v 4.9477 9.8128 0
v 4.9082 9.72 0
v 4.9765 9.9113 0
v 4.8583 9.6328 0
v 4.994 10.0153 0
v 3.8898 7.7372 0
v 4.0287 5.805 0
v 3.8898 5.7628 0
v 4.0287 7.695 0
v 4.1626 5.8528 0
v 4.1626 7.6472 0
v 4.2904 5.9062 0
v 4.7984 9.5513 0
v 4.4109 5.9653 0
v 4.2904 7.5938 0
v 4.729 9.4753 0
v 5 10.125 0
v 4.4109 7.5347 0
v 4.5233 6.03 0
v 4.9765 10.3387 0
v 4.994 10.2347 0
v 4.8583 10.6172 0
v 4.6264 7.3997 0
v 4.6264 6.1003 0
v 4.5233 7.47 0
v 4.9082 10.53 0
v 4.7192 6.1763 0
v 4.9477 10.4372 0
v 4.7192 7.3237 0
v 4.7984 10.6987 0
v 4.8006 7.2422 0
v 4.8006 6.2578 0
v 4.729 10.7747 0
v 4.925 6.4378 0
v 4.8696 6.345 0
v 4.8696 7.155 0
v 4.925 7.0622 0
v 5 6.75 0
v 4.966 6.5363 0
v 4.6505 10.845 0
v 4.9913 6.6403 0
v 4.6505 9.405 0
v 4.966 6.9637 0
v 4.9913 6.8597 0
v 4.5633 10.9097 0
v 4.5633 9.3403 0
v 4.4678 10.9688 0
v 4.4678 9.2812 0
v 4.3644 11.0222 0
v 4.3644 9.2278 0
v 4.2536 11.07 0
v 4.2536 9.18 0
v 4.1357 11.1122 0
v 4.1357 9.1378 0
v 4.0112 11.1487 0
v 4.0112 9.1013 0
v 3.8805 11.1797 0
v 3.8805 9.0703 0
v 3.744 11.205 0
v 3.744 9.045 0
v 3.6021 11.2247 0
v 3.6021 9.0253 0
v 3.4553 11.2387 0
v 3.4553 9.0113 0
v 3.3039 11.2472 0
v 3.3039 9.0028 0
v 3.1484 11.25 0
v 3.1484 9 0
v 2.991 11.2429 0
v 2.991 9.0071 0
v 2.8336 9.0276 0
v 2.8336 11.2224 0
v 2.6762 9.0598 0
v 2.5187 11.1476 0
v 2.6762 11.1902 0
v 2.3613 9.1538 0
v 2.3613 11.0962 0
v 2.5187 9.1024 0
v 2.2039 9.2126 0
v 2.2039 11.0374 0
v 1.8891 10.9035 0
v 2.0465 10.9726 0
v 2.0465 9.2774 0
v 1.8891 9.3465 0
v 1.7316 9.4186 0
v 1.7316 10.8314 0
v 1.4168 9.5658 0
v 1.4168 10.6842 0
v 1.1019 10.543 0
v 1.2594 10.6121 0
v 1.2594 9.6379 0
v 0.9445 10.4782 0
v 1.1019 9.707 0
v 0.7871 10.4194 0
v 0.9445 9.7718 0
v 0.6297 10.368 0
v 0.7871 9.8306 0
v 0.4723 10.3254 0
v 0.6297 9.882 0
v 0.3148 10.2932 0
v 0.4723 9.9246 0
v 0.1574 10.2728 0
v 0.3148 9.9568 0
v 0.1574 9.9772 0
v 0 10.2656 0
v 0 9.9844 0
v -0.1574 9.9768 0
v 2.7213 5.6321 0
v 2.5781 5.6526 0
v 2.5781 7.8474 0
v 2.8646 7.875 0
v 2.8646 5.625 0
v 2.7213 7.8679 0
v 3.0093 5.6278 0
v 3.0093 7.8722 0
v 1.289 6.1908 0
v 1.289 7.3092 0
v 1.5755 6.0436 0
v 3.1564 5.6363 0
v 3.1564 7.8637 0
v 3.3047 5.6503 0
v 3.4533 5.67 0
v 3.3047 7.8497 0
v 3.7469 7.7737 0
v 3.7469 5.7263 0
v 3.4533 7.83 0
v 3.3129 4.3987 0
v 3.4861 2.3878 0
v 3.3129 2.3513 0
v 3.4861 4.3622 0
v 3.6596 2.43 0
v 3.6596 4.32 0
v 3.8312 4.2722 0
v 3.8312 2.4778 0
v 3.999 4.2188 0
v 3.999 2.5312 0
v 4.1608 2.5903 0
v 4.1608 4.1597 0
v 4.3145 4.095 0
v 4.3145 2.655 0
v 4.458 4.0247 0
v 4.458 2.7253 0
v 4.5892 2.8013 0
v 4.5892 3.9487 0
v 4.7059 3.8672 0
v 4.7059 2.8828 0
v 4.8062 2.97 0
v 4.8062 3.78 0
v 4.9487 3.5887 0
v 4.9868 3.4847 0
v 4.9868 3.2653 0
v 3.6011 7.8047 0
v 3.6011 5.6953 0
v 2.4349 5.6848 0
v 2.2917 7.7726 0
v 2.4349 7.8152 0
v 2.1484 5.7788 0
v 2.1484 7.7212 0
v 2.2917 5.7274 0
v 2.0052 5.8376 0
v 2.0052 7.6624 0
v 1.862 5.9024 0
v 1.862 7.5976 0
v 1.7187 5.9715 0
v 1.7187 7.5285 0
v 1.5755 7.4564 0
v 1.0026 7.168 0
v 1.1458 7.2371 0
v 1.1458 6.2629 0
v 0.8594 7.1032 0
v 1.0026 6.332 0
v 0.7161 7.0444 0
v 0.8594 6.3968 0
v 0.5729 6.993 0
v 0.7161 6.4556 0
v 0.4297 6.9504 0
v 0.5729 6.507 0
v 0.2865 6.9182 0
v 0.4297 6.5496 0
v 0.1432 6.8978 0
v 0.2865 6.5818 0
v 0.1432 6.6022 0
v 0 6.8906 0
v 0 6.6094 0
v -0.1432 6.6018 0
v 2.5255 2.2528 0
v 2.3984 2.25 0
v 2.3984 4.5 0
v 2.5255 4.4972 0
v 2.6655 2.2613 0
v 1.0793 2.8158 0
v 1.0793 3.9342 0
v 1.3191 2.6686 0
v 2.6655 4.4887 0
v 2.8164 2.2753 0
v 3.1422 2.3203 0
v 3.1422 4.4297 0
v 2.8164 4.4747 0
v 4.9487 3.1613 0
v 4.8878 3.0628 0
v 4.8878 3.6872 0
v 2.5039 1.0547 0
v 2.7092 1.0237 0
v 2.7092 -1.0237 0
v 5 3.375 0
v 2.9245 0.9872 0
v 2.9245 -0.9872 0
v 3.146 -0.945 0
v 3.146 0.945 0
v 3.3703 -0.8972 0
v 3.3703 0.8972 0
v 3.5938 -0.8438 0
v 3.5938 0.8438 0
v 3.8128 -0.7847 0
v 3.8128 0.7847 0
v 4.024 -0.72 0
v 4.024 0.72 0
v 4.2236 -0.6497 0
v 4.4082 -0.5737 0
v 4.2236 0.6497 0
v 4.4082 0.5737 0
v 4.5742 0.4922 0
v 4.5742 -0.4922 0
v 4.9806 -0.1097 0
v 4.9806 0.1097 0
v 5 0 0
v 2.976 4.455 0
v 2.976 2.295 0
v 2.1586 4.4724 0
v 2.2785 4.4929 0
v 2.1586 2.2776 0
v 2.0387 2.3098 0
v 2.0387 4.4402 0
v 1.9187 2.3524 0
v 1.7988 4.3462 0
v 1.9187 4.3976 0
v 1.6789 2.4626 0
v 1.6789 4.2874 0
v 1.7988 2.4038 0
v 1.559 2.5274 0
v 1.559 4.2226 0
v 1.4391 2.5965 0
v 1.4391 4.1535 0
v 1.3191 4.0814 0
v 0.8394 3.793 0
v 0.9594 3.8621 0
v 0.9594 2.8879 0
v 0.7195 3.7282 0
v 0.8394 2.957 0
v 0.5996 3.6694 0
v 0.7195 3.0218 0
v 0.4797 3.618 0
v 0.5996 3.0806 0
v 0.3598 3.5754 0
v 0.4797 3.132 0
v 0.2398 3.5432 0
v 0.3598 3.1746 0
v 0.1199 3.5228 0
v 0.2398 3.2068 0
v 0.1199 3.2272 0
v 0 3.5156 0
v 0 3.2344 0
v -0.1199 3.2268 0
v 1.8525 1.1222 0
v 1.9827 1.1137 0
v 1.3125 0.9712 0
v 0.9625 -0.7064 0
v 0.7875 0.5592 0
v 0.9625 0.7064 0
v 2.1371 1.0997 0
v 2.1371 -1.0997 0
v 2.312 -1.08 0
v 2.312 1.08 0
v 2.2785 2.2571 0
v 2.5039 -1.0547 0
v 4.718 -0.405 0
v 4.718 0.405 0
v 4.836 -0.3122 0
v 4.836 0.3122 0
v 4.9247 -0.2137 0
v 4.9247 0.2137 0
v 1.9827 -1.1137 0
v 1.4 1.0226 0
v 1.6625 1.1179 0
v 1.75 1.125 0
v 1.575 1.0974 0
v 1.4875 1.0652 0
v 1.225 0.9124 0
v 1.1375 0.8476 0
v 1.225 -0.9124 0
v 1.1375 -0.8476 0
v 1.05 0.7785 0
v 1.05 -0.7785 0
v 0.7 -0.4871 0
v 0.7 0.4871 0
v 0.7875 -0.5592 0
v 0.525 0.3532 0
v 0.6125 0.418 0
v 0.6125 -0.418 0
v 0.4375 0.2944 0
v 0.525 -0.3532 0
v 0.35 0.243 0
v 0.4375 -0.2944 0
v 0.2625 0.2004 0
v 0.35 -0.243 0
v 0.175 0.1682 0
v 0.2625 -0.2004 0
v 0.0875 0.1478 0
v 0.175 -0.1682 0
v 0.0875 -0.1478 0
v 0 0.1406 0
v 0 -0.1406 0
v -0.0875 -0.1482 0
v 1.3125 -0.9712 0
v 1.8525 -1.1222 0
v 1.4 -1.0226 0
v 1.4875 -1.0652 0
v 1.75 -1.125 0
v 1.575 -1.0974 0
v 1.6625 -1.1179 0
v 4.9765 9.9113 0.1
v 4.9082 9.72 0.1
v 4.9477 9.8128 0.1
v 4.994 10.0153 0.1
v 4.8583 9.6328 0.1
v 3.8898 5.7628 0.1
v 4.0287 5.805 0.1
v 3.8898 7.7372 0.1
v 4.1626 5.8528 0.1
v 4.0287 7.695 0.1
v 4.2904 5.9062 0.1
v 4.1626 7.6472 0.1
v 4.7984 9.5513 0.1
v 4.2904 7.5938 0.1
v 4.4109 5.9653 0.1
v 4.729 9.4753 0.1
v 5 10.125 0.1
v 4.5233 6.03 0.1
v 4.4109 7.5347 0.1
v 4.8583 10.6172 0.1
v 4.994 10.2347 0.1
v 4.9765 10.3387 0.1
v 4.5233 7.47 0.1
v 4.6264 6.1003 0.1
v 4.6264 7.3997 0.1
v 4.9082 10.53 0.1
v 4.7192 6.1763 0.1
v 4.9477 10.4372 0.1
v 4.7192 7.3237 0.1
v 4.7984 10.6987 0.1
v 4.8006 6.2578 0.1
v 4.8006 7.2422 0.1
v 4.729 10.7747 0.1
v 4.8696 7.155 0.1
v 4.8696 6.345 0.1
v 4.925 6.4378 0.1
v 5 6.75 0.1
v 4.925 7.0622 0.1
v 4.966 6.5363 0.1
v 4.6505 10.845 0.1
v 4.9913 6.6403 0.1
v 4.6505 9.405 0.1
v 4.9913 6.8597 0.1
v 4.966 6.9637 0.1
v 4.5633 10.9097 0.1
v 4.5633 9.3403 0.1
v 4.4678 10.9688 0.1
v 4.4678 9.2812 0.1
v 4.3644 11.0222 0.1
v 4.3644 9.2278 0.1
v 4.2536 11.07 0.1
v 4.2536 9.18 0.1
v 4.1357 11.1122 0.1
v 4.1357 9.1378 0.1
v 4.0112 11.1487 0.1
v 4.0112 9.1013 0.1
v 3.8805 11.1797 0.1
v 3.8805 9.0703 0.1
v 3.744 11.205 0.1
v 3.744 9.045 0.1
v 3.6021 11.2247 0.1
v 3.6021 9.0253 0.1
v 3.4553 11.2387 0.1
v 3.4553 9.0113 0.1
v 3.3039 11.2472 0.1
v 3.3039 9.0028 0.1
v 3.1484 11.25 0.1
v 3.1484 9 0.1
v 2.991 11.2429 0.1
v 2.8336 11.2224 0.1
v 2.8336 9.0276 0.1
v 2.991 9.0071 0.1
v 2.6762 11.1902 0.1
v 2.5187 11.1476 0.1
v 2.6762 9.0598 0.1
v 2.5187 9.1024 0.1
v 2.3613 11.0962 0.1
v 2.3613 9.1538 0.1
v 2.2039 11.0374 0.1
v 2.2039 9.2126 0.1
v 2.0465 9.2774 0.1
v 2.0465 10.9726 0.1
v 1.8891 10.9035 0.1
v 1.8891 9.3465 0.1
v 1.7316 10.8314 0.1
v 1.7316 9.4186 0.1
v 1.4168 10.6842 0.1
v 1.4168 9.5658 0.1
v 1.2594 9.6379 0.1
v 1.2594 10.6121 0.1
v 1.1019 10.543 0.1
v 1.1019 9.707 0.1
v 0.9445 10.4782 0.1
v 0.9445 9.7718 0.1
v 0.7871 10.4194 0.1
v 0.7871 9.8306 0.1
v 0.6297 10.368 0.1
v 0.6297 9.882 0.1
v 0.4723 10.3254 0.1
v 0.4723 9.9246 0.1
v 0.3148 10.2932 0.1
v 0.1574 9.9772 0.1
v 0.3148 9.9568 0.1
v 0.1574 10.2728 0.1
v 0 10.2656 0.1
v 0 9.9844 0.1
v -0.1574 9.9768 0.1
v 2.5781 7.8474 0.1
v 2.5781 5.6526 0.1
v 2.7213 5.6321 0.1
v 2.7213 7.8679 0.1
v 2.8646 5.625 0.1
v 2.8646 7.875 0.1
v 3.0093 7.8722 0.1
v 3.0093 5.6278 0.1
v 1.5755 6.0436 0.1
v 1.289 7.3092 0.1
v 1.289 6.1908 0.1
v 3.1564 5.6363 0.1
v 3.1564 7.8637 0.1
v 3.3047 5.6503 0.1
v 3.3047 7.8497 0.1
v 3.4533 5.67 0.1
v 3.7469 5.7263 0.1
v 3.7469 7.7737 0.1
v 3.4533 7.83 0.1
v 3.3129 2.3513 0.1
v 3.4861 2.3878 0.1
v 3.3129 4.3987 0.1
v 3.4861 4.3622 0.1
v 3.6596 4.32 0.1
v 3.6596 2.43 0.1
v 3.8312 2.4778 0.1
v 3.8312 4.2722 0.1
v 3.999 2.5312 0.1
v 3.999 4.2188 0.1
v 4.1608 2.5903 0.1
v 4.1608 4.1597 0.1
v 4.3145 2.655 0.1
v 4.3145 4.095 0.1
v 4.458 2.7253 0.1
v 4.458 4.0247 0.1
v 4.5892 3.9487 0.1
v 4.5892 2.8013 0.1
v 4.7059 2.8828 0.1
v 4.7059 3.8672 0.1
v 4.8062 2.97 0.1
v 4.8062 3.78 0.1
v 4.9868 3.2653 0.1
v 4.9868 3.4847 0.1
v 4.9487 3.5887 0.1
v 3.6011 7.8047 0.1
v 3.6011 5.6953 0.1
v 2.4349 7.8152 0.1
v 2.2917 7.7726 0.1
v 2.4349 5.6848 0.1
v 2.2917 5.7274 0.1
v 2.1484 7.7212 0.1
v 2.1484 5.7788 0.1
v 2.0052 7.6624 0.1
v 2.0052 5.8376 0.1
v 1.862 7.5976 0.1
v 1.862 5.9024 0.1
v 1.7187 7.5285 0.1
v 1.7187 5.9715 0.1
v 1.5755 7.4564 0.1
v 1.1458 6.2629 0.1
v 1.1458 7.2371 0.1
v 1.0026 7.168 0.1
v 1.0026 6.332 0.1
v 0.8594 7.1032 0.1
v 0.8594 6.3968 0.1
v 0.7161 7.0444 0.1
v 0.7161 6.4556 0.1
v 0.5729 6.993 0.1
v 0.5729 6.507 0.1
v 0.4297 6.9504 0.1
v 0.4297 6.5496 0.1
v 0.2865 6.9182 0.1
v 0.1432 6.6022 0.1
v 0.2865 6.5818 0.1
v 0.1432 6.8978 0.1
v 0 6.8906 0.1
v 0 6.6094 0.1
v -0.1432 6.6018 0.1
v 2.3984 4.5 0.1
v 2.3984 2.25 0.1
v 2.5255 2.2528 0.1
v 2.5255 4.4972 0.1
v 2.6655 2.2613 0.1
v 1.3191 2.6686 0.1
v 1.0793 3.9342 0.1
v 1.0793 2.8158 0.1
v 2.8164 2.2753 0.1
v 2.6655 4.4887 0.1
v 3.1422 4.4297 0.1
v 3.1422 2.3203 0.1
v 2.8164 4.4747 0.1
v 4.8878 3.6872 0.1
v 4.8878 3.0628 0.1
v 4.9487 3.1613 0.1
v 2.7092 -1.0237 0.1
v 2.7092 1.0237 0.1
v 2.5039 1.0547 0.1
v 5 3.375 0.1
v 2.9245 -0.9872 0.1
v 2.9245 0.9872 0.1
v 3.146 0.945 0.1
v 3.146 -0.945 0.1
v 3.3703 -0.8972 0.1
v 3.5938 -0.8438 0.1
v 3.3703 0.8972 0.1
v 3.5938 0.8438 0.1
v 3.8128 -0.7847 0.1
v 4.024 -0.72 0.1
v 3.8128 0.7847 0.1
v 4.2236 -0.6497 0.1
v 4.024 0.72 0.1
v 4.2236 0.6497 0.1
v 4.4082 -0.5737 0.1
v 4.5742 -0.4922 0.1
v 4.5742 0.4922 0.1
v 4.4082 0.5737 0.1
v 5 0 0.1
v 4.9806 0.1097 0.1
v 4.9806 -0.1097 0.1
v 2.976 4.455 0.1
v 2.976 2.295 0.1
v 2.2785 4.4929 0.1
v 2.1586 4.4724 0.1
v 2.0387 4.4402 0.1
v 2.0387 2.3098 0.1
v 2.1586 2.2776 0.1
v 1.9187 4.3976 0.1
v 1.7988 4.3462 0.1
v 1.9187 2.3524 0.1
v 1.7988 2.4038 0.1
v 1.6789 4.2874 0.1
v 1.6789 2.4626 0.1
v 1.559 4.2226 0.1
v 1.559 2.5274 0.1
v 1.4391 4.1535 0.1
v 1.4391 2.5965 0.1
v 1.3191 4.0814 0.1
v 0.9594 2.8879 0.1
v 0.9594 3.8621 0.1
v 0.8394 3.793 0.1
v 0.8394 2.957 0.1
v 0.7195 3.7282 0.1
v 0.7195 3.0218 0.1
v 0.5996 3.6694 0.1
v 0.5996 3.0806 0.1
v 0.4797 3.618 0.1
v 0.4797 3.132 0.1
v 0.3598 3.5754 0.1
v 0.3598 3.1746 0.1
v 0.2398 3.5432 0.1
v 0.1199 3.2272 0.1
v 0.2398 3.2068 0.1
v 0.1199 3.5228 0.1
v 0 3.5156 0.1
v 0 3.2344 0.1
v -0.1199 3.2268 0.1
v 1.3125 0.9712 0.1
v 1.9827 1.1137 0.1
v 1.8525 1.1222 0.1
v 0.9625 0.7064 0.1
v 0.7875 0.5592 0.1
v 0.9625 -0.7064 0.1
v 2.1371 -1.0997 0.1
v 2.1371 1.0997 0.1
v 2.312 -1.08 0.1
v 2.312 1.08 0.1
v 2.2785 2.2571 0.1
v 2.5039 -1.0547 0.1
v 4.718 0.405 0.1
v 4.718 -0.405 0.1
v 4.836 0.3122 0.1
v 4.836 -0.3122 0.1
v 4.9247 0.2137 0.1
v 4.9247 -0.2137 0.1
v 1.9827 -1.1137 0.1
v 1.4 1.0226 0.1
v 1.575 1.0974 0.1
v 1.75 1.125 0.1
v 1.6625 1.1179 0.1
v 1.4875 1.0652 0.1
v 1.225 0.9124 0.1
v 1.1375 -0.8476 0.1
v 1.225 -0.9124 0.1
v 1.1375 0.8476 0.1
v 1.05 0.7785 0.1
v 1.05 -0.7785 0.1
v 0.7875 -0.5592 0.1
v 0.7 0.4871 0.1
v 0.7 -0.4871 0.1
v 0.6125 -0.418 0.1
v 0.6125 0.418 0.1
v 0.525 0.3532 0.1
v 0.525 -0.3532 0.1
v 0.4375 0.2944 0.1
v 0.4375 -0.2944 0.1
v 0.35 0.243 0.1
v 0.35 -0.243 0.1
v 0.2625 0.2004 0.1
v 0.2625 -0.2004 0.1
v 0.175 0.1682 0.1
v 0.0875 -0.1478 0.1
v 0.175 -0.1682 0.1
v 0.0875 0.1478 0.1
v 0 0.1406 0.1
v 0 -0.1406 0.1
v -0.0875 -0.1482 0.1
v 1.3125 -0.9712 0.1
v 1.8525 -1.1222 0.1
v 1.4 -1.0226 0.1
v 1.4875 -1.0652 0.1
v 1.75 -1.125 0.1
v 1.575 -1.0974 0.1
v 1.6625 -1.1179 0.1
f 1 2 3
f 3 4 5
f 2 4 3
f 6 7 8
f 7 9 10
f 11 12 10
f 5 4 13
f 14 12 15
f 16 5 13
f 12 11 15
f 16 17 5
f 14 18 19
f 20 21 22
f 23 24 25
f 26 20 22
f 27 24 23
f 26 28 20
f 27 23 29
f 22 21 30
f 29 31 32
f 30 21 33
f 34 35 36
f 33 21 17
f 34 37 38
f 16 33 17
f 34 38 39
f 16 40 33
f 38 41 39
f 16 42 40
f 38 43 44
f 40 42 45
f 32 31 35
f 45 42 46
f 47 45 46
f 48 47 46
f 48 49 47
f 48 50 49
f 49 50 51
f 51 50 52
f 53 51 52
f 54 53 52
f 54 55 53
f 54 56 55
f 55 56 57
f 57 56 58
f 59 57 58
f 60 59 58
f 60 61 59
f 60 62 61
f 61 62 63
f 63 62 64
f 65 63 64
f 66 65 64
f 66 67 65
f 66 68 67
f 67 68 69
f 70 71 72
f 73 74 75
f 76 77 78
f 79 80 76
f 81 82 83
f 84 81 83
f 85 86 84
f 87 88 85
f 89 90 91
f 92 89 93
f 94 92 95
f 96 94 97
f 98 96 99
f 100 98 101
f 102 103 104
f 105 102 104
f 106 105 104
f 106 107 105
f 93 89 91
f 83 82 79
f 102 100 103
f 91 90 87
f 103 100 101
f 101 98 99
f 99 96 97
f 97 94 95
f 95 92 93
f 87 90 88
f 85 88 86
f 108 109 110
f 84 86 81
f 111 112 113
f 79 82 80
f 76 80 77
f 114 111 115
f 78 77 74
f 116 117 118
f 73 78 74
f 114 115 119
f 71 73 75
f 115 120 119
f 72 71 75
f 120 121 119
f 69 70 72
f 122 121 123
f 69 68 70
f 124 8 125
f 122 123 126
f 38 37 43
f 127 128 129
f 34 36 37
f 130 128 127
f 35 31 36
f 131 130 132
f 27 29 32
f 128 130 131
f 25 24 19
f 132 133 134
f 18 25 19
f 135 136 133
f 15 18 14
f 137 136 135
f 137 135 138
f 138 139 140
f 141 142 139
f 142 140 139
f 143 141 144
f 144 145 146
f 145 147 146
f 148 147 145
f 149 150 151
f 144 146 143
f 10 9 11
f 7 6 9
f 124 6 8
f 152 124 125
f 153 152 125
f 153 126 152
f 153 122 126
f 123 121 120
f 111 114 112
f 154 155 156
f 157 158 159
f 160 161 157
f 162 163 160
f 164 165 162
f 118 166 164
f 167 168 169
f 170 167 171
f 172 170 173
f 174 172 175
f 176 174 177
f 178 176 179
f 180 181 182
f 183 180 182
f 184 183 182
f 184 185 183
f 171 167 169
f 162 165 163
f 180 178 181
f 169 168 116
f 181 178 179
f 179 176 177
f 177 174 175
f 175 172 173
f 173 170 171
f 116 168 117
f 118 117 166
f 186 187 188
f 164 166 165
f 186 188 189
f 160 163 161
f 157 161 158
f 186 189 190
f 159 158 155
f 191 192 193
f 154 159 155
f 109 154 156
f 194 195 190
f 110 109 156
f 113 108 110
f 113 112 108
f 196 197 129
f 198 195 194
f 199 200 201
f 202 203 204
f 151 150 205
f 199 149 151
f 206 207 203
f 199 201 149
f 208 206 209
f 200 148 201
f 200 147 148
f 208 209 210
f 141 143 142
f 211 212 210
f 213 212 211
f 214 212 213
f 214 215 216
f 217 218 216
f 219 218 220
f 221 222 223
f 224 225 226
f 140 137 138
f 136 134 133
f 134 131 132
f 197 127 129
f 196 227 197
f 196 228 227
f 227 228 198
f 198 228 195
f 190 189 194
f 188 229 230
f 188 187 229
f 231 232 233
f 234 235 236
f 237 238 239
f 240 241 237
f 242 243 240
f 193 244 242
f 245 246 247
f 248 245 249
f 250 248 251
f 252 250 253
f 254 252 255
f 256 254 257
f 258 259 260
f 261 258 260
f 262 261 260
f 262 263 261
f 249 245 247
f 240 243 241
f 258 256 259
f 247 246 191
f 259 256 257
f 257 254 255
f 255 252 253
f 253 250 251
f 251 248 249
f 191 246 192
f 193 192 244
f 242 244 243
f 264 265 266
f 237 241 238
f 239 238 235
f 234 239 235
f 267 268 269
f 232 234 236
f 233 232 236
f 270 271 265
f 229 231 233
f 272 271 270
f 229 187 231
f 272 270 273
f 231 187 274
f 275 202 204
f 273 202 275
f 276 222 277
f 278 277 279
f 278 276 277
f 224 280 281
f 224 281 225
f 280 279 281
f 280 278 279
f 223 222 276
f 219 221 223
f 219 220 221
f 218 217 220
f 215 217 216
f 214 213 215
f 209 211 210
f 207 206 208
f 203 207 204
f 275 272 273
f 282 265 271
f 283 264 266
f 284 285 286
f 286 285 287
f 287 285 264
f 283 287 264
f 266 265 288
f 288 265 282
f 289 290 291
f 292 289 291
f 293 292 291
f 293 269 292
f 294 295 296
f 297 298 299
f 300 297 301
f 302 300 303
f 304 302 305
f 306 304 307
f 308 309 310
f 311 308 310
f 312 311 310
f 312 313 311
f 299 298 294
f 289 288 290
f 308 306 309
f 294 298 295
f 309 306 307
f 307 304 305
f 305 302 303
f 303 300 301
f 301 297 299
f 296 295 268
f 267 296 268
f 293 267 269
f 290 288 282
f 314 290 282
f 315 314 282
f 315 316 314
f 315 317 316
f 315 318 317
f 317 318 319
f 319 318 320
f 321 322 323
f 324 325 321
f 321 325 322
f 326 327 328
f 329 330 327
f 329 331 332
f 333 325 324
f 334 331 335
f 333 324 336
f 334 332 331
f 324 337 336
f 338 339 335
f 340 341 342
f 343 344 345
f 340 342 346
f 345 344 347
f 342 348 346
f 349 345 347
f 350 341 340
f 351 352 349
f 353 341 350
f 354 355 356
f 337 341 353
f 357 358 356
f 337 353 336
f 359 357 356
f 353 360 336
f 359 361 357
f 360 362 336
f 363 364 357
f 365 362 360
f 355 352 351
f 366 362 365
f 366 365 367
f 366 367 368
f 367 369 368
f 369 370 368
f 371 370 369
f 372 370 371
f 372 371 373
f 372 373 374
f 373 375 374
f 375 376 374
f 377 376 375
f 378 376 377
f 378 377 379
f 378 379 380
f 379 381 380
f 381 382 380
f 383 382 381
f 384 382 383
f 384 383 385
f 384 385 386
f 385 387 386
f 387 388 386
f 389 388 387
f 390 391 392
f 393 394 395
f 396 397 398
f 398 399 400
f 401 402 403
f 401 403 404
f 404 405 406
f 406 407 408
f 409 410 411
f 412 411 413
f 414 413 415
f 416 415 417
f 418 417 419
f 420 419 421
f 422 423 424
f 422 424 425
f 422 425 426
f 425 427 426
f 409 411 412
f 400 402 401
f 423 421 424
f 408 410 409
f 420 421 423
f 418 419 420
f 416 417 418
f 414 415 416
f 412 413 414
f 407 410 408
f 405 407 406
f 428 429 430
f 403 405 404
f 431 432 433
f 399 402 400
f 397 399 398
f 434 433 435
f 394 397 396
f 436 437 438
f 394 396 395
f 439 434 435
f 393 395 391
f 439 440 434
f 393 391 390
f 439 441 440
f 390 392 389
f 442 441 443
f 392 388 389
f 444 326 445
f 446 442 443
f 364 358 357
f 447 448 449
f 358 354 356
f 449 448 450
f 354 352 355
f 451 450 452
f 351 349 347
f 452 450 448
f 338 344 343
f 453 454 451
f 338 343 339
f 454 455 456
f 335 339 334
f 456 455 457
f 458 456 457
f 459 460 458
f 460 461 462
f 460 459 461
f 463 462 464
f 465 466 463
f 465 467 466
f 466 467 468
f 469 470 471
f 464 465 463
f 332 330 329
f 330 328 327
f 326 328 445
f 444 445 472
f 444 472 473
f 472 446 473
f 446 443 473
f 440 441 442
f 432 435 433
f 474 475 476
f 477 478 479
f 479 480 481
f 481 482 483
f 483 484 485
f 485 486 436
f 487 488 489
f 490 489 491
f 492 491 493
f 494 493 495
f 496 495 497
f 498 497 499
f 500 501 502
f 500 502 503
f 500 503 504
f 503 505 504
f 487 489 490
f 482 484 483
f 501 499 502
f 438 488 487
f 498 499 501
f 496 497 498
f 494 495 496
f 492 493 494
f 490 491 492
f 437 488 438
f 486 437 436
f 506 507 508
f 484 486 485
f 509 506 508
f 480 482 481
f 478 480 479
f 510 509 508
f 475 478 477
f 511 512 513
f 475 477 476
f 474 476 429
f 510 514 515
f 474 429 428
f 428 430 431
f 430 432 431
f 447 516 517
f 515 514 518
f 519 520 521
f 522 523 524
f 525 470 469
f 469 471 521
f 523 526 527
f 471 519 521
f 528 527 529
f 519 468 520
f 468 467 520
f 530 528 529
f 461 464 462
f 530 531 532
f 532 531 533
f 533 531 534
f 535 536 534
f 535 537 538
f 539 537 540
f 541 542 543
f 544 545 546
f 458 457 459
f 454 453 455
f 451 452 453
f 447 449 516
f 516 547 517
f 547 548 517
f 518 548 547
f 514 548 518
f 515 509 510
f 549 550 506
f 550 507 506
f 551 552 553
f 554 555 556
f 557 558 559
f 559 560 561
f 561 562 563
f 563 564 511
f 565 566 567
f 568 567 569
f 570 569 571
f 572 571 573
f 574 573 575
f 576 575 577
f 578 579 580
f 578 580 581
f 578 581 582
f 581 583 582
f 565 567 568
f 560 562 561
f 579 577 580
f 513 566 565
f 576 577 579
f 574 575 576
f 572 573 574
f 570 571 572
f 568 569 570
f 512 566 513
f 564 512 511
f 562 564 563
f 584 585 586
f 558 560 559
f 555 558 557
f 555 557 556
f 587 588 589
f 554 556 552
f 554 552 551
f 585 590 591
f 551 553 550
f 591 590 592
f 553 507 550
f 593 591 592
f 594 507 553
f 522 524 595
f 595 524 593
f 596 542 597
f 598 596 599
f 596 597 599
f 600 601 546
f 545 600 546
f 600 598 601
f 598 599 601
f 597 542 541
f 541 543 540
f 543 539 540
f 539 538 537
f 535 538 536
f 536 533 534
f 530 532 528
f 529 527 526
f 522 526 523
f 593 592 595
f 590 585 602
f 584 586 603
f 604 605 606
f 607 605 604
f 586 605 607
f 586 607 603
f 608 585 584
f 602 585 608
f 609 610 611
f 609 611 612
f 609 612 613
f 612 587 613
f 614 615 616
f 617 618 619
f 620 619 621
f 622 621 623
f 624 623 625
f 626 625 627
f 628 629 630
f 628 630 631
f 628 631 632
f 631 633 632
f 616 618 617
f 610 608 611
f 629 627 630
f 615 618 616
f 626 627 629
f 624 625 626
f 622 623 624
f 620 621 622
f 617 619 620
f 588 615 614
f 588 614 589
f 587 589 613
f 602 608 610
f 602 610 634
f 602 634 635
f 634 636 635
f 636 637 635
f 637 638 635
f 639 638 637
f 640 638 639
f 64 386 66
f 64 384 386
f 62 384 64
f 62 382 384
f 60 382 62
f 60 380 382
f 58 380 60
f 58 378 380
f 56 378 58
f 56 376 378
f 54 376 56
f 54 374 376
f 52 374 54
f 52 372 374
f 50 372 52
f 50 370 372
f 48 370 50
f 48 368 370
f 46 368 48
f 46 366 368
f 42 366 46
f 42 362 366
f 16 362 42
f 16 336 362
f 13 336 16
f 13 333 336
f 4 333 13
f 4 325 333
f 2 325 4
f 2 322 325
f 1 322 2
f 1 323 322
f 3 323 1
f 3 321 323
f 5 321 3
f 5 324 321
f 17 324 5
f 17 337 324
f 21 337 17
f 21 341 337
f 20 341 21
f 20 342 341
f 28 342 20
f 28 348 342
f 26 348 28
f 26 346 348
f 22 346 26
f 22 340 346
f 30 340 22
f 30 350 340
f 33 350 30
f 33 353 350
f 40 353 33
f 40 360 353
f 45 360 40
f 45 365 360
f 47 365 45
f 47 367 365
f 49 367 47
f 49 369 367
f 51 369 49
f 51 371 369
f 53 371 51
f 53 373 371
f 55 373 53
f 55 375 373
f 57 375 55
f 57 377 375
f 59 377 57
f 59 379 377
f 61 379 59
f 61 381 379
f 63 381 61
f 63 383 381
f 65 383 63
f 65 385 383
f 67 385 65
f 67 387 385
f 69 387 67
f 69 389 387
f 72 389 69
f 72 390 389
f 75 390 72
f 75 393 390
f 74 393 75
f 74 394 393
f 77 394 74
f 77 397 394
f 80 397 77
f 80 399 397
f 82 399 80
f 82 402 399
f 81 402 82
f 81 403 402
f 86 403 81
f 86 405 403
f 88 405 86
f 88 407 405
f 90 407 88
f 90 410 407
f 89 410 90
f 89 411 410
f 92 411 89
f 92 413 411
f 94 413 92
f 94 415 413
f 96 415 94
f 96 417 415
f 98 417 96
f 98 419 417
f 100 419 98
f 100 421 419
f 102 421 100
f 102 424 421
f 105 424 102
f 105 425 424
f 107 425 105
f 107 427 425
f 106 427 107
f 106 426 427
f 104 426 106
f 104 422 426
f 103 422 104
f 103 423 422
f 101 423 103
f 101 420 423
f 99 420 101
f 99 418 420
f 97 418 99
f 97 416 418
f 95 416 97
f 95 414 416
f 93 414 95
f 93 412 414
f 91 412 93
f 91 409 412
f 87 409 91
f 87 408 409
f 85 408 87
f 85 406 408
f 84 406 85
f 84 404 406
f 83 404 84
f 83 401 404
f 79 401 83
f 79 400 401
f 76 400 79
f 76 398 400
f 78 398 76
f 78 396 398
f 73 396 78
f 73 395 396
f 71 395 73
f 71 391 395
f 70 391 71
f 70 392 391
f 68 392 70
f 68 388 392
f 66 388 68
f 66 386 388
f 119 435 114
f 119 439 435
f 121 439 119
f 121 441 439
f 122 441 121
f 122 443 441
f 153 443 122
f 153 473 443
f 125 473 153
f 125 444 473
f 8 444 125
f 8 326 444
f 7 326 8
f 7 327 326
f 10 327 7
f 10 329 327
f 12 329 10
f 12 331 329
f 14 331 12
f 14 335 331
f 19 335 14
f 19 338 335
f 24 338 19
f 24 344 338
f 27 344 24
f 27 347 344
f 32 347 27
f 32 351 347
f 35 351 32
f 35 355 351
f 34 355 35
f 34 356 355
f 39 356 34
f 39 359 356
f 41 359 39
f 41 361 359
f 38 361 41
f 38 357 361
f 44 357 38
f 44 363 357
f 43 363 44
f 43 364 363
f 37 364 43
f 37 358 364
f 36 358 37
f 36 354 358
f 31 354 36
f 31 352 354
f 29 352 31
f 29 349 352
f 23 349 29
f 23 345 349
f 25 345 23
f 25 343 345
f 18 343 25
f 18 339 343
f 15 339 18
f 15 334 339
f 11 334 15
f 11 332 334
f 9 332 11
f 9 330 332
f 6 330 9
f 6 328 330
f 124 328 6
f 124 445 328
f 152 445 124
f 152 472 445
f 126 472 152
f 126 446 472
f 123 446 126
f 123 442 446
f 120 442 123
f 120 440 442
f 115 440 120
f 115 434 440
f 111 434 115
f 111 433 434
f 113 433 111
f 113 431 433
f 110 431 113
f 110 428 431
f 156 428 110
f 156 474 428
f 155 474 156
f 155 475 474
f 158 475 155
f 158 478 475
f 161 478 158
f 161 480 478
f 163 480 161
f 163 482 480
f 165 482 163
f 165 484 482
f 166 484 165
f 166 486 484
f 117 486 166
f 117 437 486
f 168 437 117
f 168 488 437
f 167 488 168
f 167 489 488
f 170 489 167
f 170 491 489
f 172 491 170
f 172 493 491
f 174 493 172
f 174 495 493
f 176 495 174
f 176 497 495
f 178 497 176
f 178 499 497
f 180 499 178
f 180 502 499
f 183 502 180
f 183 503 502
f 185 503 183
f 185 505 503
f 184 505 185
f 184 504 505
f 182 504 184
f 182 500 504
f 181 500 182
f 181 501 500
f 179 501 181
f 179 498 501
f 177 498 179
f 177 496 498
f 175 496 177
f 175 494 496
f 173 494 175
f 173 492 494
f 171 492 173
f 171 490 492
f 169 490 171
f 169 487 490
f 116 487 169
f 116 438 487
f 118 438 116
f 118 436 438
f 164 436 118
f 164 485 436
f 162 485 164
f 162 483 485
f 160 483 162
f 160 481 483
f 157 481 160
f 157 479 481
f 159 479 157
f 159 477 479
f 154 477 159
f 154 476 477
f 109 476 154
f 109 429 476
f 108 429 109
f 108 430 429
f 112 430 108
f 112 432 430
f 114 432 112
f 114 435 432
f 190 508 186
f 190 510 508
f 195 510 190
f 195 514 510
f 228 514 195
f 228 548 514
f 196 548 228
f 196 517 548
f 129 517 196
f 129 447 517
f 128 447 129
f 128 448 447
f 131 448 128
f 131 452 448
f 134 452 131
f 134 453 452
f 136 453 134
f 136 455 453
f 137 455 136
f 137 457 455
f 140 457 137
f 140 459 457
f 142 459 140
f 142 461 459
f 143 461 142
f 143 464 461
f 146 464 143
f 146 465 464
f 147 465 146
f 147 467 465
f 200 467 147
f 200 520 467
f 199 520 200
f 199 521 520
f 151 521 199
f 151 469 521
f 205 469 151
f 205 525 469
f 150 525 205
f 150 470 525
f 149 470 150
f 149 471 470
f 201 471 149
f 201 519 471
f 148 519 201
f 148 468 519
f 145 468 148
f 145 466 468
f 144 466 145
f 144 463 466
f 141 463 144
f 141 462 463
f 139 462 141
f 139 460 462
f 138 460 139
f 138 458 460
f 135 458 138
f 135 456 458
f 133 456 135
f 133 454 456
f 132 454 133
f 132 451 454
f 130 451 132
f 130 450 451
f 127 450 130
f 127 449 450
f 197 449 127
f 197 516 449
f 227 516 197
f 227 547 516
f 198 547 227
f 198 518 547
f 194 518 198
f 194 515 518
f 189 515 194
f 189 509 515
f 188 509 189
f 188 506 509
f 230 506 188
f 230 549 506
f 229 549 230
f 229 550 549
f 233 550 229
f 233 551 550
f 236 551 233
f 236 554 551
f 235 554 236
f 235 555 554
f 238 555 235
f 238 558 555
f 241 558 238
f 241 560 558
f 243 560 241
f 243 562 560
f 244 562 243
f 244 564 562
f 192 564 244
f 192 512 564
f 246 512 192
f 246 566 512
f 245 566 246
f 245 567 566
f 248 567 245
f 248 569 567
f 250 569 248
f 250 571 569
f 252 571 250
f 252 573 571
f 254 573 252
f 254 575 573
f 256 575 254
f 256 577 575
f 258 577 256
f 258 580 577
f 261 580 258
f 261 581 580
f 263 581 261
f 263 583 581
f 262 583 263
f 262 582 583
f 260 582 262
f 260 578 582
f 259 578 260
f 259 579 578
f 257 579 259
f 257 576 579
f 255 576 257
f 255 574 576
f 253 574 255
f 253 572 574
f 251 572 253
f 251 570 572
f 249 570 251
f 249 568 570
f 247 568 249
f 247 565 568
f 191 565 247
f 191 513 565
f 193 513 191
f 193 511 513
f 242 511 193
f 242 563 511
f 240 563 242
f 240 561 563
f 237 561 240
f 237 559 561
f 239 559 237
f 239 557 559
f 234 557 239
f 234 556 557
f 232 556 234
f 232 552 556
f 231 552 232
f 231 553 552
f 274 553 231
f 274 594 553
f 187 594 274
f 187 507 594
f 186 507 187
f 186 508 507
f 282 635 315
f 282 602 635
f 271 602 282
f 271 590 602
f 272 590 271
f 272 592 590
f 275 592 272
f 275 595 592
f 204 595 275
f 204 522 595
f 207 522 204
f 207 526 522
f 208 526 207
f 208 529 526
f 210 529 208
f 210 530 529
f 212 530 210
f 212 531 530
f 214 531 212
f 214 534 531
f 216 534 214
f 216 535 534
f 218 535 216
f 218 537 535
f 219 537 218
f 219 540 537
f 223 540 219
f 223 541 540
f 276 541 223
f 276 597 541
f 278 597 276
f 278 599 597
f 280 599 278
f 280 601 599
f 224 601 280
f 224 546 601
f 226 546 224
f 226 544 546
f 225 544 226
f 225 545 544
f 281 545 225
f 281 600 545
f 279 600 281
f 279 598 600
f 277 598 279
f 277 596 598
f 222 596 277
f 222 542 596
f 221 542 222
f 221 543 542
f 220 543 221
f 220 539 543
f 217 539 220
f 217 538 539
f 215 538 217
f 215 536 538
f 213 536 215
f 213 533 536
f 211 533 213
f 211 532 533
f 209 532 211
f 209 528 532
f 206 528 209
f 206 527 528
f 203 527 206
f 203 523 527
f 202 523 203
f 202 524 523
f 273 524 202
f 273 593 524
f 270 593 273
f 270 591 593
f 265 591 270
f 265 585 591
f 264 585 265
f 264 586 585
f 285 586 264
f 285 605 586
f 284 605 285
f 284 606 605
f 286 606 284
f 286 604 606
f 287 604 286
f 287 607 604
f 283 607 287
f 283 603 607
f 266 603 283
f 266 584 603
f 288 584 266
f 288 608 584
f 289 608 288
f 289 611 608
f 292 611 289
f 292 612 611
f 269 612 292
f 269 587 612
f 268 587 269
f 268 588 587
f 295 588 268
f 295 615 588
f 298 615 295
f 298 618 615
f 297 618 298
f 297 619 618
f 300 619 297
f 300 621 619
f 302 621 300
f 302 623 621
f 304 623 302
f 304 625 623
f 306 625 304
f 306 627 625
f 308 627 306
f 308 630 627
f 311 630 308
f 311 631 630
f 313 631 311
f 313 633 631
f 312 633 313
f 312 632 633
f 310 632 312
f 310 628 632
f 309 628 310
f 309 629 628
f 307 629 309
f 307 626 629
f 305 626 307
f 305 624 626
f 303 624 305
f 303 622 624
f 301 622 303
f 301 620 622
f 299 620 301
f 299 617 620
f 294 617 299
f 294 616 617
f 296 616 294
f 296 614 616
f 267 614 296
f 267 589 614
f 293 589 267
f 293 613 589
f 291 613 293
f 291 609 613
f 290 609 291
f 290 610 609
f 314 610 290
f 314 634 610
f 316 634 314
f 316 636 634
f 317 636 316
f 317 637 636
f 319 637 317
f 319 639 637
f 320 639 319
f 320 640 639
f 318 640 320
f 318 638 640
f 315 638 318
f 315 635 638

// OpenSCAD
// Root chord as a fraction of Cmax (was 1/10). File scope so the
// half chord function below uses the same value as the outline.
root_fraction = 1/8;

// Approximate position of maximum Chord as a fucntion of Pd.
function CmaxPosition(Pd) = -0.07291667*Pd*Pd + 0.44166667*Pd - 0.01875;

// Half the chord at radius fraction f along the blade, for callers that need
// the plan form as a width function rather than an outline. Samples the same
// upper edge segments the polygon is built from (c0 then c1) and interpolates
// between the two samples that straddle the requested station.
function planform_halfchord(dia, Pd, Cmax, f) =
    let (pts = planform_upper(dia, Pd, Cmax),
         x = dia * f)
    planform_lookup(pts, x);

// The upper edge as [x, y] samples, root to tip. Sampled far more finely than
// the outline polygon needs: the lookup below interpolates between these, and
// near the tip the curve falls away steeply enough that coarse samples would
// cut the corner off.
Ufine = [for (i=[0:0.005:1.0005]) [1,i,i*i,i*i*i]];

function planform_upper(dia, Pd, Cmax) =
    let (cp = dia * CmaxPosition(Pd),
         rf = root_fraction,
         c0 = [[0,Cmax*rf/2], [cp,0], [cp,Cmax/2], [cp,0]],
         c1 = [[cp,Cmax/2], [cp,0], [dia,0], [0,-(Cmax)]])
    concat([for (p = Ufine*Hinv*c0) p], [for (p = Ufine*Hinv*c1) p]);

// Largest y at x over the sample list. More than one segment can straddle x
// where samples bunch together, so taking the maximum keeps the outline on
// the outside of the curve. Returns 0 past the tip, where the chord runs out.
function planform_lookup(pts, x) =
    max([for (i = [0:len(pts)-2])
            let (x0 = pts[i][0], x1 = pts[i+1][0])
            (min(x0,x1) <= x && x <= max(x0,x1) && abs(x1-x0) > 1e-9)
                ? pts[i][1] + (pts[i+1][1]-pts[i][1])*(x-x0)/(x1-x0)
                : 0]);

Hinv = [
    [1.,0.,0.,0.],
    [0.,1.,0.,0.],
    [-3.,-2.,3.,-1.],
    [ 2.,1.,-2.,1.]
];

U = [for (i=[0:.05:1.05]) [1,i,i*i,i*i*i]];

Chord = 2.25;
linear_extrude(.1) {
    translate([0, Chord*0.0, 0]) larrabee_planform (5, 1.0, Chord);
    translate([0, Chord*1.5, 0]) larrabee_planform (5, 1.5, Chord);
    translate([0, Chord*3.0, 0]) larrabee_planform (5, 2.0, Chord);
    translate([0, Chord*4.5, 0]) larrabee_planform (5, 2.5, Chord);
}


module larrabee_planform(dia, Pd, Cmax) {

    cp = dia * CmaxPosition(Pd);

    c0 = [[0,Cmax*root_fraction/2], [cp,0], [cp,Cmax/2], [cp,0]];
    c1 = [[cp,Cmax/2], [cp,0], [dia,0], [0,-(Cmax)]];
    c2 = [[dia,0],[0,-(Cmax)], [cp,-Cmax/2], [-cp,0]];
    c3 = [[cp,-Cmax/2], [-cp,0], [0,-Cmax*root_fraction/2], [-cp,0]];

    path = [c0, c1, c2, c3];
    /*
    color("Blue") {
        translate([cp,0]) circle(Cmax/2, $fn=48);
        translate([dia-Cmax/6,0]) circle(Cmax/6, $fn=48);
    }
    */
    
    polygon([for(c = path) for (p = U*Hinv*c) p]);
/*
    for (c = path) {
        coef = Hinv*c;
        for (p = U*coef) {
            translate(p) circle(.05);
        }
    }
*/
}
